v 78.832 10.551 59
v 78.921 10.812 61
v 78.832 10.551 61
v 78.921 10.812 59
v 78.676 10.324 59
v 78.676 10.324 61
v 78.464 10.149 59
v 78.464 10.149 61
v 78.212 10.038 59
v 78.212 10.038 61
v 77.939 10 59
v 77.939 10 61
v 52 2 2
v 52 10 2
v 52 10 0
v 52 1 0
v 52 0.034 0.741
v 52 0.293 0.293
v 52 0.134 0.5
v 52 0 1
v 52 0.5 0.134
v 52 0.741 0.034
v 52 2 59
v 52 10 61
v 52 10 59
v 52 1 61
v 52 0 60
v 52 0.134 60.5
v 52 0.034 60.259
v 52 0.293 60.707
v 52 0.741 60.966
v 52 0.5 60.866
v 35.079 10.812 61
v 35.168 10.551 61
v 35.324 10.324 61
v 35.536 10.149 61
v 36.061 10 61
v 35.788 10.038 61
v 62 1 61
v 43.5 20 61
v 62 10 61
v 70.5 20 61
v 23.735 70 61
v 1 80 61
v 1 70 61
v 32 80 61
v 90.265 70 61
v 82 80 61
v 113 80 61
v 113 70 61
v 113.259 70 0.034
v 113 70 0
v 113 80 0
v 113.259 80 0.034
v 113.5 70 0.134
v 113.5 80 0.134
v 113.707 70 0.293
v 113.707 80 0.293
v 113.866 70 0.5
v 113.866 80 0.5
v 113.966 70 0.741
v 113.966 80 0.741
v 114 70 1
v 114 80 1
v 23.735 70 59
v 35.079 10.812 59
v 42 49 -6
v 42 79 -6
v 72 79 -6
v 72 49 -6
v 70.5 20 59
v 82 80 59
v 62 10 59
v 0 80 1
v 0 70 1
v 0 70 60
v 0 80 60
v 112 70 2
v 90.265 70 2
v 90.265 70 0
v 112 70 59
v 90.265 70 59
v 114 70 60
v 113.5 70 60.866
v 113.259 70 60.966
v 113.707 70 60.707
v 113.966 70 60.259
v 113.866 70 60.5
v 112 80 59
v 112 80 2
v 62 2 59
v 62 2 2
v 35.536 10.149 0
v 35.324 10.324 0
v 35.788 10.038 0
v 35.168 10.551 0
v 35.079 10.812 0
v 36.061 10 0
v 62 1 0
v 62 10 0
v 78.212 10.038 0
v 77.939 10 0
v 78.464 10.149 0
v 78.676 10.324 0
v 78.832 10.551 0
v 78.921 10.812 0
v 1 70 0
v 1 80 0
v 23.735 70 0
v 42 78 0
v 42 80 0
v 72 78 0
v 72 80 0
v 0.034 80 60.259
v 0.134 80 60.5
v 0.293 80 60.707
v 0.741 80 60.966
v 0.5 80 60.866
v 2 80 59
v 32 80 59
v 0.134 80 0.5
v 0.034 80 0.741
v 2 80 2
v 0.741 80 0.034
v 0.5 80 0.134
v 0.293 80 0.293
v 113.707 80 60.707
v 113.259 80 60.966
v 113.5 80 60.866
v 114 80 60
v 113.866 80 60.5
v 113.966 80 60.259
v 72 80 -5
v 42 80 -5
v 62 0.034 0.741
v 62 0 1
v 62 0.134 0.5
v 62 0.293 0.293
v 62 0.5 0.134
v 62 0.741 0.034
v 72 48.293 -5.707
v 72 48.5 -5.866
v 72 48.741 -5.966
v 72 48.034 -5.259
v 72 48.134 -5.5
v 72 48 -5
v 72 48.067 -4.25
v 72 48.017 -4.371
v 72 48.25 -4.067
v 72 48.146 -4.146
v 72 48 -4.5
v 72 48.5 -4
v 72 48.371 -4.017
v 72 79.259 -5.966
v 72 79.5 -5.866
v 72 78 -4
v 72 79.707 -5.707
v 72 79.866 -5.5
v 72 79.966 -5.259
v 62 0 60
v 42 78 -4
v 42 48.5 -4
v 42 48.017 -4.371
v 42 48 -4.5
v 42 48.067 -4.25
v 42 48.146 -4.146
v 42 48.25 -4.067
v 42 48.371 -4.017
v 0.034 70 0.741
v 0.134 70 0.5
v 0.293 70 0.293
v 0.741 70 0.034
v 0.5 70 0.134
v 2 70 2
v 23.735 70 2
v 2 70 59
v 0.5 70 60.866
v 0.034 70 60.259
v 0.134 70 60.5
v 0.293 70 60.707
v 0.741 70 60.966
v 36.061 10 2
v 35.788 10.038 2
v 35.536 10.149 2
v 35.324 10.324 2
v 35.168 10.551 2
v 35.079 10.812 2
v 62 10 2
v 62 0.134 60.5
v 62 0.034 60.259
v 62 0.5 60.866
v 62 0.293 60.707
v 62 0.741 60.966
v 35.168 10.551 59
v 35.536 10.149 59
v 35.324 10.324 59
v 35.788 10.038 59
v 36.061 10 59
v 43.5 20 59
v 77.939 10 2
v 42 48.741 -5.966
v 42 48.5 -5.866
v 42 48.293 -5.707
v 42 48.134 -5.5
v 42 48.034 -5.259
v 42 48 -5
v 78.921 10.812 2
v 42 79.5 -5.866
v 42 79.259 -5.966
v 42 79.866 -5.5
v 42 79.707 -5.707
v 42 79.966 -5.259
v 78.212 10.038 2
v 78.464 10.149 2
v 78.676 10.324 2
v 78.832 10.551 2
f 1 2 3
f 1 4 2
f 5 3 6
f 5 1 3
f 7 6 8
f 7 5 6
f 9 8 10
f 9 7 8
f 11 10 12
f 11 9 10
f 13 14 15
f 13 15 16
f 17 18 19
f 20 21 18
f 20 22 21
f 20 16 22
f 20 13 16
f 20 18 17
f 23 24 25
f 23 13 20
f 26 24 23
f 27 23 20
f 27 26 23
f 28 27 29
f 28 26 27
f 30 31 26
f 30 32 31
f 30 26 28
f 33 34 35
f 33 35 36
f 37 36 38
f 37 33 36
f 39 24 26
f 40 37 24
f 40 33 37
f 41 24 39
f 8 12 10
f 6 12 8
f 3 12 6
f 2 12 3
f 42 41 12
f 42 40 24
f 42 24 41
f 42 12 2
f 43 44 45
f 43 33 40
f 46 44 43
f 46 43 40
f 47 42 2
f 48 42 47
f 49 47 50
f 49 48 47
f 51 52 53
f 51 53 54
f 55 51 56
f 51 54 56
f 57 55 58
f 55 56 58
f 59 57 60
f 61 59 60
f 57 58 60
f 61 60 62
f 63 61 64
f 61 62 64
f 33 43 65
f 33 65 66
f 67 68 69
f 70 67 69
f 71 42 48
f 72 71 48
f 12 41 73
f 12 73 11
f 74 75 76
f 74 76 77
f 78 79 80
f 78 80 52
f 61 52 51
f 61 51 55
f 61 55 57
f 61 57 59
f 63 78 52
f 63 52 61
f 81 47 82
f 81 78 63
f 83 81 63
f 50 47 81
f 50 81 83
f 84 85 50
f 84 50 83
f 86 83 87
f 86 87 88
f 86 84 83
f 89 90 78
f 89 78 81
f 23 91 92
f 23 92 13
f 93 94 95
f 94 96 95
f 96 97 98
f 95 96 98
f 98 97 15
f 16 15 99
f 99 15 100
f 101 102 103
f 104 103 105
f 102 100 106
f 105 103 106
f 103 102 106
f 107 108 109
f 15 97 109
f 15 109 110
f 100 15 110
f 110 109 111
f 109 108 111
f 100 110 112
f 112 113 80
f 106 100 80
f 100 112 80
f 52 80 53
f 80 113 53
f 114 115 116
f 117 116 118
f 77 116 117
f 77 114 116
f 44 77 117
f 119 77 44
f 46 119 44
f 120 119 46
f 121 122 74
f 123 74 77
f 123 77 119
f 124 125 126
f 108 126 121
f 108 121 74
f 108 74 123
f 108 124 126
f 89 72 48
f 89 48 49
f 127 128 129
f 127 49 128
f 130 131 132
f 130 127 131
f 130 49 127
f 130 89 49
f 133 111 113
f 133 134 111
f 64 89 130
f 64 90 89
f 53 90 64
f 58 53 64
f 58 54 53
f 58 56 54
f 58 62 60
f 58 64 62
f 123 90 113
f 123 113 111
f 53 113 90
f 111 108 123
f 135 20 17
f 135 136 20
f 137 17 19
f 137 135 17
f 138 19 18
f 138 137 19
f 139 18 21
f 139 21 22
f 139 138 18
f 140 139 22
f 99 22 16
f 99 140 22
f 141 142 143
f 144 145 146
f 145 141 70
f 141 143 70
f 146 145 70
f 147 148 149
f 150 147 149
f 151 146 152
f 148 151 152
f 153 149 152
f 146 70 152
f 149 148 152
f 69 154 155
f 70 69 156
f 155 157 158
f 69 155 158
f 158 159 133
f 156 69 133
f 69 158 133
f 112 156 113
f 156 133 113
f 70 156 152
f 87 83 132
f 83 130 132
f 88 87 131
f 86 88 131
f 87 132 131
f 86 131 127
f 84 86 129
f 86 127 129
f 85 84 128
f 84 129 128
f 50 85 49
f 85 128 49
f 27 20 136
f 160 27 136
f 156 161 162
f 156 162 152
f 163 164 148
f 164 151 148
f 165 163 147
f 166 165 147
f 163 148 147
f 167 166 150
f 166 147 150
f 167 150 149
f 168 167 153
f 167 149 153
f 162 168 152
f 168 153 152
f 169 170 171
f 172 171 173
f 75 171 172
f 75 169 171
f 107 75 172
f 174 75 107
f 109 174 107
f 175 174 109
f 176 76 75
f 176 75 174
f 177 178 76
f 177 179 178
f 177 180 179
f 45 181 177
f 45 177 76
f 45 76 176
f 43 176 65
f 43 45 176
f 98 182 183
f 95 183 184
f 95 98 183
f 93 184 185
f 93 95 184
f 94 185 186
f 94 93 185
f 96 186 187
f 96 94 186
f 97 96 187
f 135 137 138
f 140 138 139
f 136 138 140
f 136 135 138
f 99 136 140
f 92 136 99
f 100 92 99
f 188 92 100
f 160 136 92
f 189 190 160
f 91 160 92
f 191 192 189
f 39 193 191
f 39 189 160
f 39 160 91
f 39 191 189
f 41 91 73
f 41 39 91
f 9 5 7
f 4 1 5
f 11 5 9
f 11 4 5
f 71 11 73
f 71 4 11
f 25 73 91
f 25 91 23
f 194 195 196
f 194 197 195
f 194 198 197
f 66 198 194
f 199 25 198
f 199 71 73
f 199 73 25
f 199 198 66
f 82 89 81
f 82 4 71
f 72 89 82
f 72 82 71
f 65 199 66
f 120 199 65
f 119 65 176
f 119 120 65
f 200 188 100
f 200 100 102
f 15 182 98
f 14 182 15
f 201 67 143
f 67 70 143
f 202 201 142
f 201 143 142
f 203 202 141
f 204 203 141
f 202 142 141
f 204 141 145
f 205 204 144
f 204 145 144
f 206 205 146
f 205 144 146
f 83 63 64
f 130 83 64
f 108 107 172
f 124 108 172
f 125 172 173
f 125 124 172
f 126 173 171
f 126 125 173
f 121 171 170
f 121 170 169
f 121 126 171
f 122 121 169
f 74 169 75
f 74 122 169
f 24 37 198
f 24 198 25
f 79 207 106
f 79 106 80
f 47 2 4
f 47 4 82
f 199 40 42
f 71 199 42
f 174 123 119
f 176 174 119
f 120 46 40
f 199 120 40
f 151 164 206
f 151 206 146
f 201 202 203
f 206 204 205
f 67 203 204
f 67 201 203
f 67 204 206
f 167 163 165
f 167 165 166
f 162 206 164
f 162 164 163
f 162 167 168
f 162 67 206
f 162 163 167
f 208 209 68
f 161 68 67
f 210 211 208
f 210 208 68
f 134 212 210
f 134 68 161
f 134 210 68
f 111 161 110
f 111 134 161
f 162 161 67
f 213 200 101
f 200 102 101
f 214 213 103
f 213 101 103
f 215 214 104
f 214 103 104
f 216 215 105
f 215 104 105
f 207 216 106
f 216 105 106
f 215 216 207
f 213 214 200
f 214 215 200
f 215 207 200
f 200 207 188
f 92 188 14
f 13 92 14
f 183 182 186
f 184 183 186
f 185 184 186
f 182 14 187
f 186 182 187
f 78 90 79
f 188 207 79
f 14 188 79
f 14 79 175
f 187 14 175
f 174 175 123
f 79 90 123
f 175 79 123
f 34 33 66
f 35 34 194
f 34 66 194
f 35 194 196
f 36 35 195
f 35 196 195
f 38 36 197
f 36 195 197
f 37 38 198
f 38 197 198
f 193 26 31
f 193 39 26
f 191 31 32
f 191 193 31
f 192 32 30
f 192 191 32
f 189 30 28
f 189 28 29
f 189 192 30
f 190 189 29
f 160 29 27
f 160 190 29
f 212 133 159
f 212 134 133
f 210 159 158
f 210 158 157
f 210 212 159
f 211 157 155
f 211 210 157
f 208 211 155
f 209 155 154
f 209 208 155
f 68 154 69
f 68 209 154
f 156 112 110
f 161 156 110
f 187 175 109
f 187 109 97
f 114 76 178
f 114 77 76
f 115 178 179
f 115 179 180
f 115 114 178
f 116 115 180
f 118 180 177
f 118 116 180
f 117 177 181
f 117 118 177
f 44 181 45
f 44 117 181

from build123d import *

# Parameters (mm, degrees)
SKETCH_W        = 114
SKETCH_H        = 80
PAD_DEPTH       = 61
SKETCH001_W     = 110
SKETCH001_H     = 57
POCKET_DEPTH    = 78
POCKET001_DEPTH = 2
POCKET002_DEPTH = 90
SKETCH004_W     = 30
SKETCH004_H     = 6
PAD001_DEPTH    = 2
SKETCH005_W     = 30
SKETCH005_H     = 2
PAD002_DEPTH    = 30
FILLET_R        = 1
FILLET001_R     = 1
FILLET002_R     = 1
FILLET003_R     = 1
FILLET004_R     = 1
FILLET005_R     = 0.5
FILLET006_R     = 1
FILLET007_R     = 1
FILLET008_R     = 1
FILLET009_R     = 1
FILLET010_R     = 1


with BuildPart() as part:
    # Sketch → Pad (new body)
    with BuildSketch(Plane.XY):
        with Locations((57, 40)):
            Rectangle(SKETCH_W, SKETCH_H)
    extrude(amount=PAD_DEPTH)

    # Sketch001 (on Face1 of Pad) → Pocket (cut)
    with BuildSketch(Plane(origin=(0, 80, 0), x_dir=(-1, 0, 0), z_dir=(0, 1, 0))):
        with Locations((-57, 30.5)):
            Rectangle(SKETCH001_W, SKETCH001_H)
    extrude(amount=-POCKET_DEPTH, mode=Mode.SUBTRACT)

    # Sketch002 (on Face4 of Pocket) → Pocket001 (cut)
    with BuildSketch(Plane.XY.offset(61)):
        Polygon((32, 80), (43.5, 20), (70.5, 20), (82, 80), align=None)
    extrude(amount=-POCKET001_DEPTH, mode=Mode.SUBTRACT)

    # Sketch003 (on Face4 of Pocket001) → Pocket002 (cut)
    with BuildSketch(Plane.XY.offset(61)):
        Polygon((0, 70), (23.734643, 70), (35.234643, 10), (52, 10), (52, 0), (0, 0), align=None)
        Polygon((78.765357, 10), (90.265357, 70), (114, 70), (114, 0), (62, 0), (62, 10), align=None)
    extrude(amount=-POCKET002_DEPTH, mode=Mode.SUBTRACT)

    # Sketch004 (on Face1 of Pocket002) → Pad001 (join)
    with BuildSketch(Plane(origin=(0, 80, 0), x_dir=(-1, 0, 0), z_dir=(0, 1, 0))):
        with Locations((-57, -3)):
            Rectangle(SKETCH004_W, SKETCH004_H)
    extrude(amount=-PAD001_DEPTH)

    # Sketch005 (on Face23 of Pad001) → Pad002 (join)
    with BuildSketch(Plane.XZ.offset(-78)):
        with Locations((57, -5)):
            Rectangle(SKETCH005_W, SKETCH005_H)
    extrude(amount=PAD002_DEPTH)

    # Fillet
    fillet_edges = [part.edges().sort_by_distance(p)[0] for p in [
        (78.765357, 10, 1),
    ]]
    fillet(fillet_edges, radius=FILLET_R)

    # Fillet001
    fillet001_edges = [part.edges().sort_by_distance(p)[0] for p in [
        (114, 75, 0),
    ]]
    fillet(fillet001_edges, radius=FILLET001_R)

    # Fillet002
    fillet002_edges = [part.edges().sort_by_distance(p)[0] for p in [
        (114, 75, 61),
    ]]
    fillet(fillet002_edges, radius=FILLET002_R)

    # Fillet003
    fillet003_edges = [part.edges().sort_by_distance(p)[0] for p in [
        (57, 80, -6),
    ]]
    fillet(fillet003_edges, radius=FILLET003_R)

    # Fillet004
    fillet004_edges = [part.edges().sort_by_distance(p)[0] for p in [
        (57, 48, -6),
    ]]
    fillet(fillet004_edges, radius=FILLET004_R)

    # Fillet005
    fillet005_edges = [part.edges().sort_by_distance(p)[0] for p in [
        (57, 48, -4),
    ]]
    fillet(fillet005_edges, radius=FILLET005_R)

    # Fillet006
    fillet006_edges = [part.edges().sort_by_distance(p)[0] for p in [
        (0, 75, 0),
    ]]
    fillet(fillet006_edges, radius=FILLET006_R)

    # Fillet007
    fillet007_edges = [part.edges().sort_by_distance(p)[0] for p in [
        (0, 75, 61),
    ]]
    fillet(fillet007_edges, radius=FILLET007_R)

    # Fillet008
    fillet008_edges = [part.edges().sort_by_distance(p)[0] for p in [
        (78.765357, 10, 60),
        (35.234643, 10, 60),
    ]]
    fillet(fillet008_edges, radius=FILLET008_R)

    # Fillet009
    fillet009_edges = [part.edges().sort_by_distance(p)[0] for p in [
        (57, 0, 61),
        (57, 0, 0),
    ]]
    fillet(fillet009_edges, radius=FILLET009_R)

    # Fillet010
    fillet010_edges = [part.edges().sort_by_distance(p)[0] for p in [
        (35.234643, 10, 1),
    ]]
    fillet(fillet010_edges, radius=FILLET010_R)


solid = part.part
